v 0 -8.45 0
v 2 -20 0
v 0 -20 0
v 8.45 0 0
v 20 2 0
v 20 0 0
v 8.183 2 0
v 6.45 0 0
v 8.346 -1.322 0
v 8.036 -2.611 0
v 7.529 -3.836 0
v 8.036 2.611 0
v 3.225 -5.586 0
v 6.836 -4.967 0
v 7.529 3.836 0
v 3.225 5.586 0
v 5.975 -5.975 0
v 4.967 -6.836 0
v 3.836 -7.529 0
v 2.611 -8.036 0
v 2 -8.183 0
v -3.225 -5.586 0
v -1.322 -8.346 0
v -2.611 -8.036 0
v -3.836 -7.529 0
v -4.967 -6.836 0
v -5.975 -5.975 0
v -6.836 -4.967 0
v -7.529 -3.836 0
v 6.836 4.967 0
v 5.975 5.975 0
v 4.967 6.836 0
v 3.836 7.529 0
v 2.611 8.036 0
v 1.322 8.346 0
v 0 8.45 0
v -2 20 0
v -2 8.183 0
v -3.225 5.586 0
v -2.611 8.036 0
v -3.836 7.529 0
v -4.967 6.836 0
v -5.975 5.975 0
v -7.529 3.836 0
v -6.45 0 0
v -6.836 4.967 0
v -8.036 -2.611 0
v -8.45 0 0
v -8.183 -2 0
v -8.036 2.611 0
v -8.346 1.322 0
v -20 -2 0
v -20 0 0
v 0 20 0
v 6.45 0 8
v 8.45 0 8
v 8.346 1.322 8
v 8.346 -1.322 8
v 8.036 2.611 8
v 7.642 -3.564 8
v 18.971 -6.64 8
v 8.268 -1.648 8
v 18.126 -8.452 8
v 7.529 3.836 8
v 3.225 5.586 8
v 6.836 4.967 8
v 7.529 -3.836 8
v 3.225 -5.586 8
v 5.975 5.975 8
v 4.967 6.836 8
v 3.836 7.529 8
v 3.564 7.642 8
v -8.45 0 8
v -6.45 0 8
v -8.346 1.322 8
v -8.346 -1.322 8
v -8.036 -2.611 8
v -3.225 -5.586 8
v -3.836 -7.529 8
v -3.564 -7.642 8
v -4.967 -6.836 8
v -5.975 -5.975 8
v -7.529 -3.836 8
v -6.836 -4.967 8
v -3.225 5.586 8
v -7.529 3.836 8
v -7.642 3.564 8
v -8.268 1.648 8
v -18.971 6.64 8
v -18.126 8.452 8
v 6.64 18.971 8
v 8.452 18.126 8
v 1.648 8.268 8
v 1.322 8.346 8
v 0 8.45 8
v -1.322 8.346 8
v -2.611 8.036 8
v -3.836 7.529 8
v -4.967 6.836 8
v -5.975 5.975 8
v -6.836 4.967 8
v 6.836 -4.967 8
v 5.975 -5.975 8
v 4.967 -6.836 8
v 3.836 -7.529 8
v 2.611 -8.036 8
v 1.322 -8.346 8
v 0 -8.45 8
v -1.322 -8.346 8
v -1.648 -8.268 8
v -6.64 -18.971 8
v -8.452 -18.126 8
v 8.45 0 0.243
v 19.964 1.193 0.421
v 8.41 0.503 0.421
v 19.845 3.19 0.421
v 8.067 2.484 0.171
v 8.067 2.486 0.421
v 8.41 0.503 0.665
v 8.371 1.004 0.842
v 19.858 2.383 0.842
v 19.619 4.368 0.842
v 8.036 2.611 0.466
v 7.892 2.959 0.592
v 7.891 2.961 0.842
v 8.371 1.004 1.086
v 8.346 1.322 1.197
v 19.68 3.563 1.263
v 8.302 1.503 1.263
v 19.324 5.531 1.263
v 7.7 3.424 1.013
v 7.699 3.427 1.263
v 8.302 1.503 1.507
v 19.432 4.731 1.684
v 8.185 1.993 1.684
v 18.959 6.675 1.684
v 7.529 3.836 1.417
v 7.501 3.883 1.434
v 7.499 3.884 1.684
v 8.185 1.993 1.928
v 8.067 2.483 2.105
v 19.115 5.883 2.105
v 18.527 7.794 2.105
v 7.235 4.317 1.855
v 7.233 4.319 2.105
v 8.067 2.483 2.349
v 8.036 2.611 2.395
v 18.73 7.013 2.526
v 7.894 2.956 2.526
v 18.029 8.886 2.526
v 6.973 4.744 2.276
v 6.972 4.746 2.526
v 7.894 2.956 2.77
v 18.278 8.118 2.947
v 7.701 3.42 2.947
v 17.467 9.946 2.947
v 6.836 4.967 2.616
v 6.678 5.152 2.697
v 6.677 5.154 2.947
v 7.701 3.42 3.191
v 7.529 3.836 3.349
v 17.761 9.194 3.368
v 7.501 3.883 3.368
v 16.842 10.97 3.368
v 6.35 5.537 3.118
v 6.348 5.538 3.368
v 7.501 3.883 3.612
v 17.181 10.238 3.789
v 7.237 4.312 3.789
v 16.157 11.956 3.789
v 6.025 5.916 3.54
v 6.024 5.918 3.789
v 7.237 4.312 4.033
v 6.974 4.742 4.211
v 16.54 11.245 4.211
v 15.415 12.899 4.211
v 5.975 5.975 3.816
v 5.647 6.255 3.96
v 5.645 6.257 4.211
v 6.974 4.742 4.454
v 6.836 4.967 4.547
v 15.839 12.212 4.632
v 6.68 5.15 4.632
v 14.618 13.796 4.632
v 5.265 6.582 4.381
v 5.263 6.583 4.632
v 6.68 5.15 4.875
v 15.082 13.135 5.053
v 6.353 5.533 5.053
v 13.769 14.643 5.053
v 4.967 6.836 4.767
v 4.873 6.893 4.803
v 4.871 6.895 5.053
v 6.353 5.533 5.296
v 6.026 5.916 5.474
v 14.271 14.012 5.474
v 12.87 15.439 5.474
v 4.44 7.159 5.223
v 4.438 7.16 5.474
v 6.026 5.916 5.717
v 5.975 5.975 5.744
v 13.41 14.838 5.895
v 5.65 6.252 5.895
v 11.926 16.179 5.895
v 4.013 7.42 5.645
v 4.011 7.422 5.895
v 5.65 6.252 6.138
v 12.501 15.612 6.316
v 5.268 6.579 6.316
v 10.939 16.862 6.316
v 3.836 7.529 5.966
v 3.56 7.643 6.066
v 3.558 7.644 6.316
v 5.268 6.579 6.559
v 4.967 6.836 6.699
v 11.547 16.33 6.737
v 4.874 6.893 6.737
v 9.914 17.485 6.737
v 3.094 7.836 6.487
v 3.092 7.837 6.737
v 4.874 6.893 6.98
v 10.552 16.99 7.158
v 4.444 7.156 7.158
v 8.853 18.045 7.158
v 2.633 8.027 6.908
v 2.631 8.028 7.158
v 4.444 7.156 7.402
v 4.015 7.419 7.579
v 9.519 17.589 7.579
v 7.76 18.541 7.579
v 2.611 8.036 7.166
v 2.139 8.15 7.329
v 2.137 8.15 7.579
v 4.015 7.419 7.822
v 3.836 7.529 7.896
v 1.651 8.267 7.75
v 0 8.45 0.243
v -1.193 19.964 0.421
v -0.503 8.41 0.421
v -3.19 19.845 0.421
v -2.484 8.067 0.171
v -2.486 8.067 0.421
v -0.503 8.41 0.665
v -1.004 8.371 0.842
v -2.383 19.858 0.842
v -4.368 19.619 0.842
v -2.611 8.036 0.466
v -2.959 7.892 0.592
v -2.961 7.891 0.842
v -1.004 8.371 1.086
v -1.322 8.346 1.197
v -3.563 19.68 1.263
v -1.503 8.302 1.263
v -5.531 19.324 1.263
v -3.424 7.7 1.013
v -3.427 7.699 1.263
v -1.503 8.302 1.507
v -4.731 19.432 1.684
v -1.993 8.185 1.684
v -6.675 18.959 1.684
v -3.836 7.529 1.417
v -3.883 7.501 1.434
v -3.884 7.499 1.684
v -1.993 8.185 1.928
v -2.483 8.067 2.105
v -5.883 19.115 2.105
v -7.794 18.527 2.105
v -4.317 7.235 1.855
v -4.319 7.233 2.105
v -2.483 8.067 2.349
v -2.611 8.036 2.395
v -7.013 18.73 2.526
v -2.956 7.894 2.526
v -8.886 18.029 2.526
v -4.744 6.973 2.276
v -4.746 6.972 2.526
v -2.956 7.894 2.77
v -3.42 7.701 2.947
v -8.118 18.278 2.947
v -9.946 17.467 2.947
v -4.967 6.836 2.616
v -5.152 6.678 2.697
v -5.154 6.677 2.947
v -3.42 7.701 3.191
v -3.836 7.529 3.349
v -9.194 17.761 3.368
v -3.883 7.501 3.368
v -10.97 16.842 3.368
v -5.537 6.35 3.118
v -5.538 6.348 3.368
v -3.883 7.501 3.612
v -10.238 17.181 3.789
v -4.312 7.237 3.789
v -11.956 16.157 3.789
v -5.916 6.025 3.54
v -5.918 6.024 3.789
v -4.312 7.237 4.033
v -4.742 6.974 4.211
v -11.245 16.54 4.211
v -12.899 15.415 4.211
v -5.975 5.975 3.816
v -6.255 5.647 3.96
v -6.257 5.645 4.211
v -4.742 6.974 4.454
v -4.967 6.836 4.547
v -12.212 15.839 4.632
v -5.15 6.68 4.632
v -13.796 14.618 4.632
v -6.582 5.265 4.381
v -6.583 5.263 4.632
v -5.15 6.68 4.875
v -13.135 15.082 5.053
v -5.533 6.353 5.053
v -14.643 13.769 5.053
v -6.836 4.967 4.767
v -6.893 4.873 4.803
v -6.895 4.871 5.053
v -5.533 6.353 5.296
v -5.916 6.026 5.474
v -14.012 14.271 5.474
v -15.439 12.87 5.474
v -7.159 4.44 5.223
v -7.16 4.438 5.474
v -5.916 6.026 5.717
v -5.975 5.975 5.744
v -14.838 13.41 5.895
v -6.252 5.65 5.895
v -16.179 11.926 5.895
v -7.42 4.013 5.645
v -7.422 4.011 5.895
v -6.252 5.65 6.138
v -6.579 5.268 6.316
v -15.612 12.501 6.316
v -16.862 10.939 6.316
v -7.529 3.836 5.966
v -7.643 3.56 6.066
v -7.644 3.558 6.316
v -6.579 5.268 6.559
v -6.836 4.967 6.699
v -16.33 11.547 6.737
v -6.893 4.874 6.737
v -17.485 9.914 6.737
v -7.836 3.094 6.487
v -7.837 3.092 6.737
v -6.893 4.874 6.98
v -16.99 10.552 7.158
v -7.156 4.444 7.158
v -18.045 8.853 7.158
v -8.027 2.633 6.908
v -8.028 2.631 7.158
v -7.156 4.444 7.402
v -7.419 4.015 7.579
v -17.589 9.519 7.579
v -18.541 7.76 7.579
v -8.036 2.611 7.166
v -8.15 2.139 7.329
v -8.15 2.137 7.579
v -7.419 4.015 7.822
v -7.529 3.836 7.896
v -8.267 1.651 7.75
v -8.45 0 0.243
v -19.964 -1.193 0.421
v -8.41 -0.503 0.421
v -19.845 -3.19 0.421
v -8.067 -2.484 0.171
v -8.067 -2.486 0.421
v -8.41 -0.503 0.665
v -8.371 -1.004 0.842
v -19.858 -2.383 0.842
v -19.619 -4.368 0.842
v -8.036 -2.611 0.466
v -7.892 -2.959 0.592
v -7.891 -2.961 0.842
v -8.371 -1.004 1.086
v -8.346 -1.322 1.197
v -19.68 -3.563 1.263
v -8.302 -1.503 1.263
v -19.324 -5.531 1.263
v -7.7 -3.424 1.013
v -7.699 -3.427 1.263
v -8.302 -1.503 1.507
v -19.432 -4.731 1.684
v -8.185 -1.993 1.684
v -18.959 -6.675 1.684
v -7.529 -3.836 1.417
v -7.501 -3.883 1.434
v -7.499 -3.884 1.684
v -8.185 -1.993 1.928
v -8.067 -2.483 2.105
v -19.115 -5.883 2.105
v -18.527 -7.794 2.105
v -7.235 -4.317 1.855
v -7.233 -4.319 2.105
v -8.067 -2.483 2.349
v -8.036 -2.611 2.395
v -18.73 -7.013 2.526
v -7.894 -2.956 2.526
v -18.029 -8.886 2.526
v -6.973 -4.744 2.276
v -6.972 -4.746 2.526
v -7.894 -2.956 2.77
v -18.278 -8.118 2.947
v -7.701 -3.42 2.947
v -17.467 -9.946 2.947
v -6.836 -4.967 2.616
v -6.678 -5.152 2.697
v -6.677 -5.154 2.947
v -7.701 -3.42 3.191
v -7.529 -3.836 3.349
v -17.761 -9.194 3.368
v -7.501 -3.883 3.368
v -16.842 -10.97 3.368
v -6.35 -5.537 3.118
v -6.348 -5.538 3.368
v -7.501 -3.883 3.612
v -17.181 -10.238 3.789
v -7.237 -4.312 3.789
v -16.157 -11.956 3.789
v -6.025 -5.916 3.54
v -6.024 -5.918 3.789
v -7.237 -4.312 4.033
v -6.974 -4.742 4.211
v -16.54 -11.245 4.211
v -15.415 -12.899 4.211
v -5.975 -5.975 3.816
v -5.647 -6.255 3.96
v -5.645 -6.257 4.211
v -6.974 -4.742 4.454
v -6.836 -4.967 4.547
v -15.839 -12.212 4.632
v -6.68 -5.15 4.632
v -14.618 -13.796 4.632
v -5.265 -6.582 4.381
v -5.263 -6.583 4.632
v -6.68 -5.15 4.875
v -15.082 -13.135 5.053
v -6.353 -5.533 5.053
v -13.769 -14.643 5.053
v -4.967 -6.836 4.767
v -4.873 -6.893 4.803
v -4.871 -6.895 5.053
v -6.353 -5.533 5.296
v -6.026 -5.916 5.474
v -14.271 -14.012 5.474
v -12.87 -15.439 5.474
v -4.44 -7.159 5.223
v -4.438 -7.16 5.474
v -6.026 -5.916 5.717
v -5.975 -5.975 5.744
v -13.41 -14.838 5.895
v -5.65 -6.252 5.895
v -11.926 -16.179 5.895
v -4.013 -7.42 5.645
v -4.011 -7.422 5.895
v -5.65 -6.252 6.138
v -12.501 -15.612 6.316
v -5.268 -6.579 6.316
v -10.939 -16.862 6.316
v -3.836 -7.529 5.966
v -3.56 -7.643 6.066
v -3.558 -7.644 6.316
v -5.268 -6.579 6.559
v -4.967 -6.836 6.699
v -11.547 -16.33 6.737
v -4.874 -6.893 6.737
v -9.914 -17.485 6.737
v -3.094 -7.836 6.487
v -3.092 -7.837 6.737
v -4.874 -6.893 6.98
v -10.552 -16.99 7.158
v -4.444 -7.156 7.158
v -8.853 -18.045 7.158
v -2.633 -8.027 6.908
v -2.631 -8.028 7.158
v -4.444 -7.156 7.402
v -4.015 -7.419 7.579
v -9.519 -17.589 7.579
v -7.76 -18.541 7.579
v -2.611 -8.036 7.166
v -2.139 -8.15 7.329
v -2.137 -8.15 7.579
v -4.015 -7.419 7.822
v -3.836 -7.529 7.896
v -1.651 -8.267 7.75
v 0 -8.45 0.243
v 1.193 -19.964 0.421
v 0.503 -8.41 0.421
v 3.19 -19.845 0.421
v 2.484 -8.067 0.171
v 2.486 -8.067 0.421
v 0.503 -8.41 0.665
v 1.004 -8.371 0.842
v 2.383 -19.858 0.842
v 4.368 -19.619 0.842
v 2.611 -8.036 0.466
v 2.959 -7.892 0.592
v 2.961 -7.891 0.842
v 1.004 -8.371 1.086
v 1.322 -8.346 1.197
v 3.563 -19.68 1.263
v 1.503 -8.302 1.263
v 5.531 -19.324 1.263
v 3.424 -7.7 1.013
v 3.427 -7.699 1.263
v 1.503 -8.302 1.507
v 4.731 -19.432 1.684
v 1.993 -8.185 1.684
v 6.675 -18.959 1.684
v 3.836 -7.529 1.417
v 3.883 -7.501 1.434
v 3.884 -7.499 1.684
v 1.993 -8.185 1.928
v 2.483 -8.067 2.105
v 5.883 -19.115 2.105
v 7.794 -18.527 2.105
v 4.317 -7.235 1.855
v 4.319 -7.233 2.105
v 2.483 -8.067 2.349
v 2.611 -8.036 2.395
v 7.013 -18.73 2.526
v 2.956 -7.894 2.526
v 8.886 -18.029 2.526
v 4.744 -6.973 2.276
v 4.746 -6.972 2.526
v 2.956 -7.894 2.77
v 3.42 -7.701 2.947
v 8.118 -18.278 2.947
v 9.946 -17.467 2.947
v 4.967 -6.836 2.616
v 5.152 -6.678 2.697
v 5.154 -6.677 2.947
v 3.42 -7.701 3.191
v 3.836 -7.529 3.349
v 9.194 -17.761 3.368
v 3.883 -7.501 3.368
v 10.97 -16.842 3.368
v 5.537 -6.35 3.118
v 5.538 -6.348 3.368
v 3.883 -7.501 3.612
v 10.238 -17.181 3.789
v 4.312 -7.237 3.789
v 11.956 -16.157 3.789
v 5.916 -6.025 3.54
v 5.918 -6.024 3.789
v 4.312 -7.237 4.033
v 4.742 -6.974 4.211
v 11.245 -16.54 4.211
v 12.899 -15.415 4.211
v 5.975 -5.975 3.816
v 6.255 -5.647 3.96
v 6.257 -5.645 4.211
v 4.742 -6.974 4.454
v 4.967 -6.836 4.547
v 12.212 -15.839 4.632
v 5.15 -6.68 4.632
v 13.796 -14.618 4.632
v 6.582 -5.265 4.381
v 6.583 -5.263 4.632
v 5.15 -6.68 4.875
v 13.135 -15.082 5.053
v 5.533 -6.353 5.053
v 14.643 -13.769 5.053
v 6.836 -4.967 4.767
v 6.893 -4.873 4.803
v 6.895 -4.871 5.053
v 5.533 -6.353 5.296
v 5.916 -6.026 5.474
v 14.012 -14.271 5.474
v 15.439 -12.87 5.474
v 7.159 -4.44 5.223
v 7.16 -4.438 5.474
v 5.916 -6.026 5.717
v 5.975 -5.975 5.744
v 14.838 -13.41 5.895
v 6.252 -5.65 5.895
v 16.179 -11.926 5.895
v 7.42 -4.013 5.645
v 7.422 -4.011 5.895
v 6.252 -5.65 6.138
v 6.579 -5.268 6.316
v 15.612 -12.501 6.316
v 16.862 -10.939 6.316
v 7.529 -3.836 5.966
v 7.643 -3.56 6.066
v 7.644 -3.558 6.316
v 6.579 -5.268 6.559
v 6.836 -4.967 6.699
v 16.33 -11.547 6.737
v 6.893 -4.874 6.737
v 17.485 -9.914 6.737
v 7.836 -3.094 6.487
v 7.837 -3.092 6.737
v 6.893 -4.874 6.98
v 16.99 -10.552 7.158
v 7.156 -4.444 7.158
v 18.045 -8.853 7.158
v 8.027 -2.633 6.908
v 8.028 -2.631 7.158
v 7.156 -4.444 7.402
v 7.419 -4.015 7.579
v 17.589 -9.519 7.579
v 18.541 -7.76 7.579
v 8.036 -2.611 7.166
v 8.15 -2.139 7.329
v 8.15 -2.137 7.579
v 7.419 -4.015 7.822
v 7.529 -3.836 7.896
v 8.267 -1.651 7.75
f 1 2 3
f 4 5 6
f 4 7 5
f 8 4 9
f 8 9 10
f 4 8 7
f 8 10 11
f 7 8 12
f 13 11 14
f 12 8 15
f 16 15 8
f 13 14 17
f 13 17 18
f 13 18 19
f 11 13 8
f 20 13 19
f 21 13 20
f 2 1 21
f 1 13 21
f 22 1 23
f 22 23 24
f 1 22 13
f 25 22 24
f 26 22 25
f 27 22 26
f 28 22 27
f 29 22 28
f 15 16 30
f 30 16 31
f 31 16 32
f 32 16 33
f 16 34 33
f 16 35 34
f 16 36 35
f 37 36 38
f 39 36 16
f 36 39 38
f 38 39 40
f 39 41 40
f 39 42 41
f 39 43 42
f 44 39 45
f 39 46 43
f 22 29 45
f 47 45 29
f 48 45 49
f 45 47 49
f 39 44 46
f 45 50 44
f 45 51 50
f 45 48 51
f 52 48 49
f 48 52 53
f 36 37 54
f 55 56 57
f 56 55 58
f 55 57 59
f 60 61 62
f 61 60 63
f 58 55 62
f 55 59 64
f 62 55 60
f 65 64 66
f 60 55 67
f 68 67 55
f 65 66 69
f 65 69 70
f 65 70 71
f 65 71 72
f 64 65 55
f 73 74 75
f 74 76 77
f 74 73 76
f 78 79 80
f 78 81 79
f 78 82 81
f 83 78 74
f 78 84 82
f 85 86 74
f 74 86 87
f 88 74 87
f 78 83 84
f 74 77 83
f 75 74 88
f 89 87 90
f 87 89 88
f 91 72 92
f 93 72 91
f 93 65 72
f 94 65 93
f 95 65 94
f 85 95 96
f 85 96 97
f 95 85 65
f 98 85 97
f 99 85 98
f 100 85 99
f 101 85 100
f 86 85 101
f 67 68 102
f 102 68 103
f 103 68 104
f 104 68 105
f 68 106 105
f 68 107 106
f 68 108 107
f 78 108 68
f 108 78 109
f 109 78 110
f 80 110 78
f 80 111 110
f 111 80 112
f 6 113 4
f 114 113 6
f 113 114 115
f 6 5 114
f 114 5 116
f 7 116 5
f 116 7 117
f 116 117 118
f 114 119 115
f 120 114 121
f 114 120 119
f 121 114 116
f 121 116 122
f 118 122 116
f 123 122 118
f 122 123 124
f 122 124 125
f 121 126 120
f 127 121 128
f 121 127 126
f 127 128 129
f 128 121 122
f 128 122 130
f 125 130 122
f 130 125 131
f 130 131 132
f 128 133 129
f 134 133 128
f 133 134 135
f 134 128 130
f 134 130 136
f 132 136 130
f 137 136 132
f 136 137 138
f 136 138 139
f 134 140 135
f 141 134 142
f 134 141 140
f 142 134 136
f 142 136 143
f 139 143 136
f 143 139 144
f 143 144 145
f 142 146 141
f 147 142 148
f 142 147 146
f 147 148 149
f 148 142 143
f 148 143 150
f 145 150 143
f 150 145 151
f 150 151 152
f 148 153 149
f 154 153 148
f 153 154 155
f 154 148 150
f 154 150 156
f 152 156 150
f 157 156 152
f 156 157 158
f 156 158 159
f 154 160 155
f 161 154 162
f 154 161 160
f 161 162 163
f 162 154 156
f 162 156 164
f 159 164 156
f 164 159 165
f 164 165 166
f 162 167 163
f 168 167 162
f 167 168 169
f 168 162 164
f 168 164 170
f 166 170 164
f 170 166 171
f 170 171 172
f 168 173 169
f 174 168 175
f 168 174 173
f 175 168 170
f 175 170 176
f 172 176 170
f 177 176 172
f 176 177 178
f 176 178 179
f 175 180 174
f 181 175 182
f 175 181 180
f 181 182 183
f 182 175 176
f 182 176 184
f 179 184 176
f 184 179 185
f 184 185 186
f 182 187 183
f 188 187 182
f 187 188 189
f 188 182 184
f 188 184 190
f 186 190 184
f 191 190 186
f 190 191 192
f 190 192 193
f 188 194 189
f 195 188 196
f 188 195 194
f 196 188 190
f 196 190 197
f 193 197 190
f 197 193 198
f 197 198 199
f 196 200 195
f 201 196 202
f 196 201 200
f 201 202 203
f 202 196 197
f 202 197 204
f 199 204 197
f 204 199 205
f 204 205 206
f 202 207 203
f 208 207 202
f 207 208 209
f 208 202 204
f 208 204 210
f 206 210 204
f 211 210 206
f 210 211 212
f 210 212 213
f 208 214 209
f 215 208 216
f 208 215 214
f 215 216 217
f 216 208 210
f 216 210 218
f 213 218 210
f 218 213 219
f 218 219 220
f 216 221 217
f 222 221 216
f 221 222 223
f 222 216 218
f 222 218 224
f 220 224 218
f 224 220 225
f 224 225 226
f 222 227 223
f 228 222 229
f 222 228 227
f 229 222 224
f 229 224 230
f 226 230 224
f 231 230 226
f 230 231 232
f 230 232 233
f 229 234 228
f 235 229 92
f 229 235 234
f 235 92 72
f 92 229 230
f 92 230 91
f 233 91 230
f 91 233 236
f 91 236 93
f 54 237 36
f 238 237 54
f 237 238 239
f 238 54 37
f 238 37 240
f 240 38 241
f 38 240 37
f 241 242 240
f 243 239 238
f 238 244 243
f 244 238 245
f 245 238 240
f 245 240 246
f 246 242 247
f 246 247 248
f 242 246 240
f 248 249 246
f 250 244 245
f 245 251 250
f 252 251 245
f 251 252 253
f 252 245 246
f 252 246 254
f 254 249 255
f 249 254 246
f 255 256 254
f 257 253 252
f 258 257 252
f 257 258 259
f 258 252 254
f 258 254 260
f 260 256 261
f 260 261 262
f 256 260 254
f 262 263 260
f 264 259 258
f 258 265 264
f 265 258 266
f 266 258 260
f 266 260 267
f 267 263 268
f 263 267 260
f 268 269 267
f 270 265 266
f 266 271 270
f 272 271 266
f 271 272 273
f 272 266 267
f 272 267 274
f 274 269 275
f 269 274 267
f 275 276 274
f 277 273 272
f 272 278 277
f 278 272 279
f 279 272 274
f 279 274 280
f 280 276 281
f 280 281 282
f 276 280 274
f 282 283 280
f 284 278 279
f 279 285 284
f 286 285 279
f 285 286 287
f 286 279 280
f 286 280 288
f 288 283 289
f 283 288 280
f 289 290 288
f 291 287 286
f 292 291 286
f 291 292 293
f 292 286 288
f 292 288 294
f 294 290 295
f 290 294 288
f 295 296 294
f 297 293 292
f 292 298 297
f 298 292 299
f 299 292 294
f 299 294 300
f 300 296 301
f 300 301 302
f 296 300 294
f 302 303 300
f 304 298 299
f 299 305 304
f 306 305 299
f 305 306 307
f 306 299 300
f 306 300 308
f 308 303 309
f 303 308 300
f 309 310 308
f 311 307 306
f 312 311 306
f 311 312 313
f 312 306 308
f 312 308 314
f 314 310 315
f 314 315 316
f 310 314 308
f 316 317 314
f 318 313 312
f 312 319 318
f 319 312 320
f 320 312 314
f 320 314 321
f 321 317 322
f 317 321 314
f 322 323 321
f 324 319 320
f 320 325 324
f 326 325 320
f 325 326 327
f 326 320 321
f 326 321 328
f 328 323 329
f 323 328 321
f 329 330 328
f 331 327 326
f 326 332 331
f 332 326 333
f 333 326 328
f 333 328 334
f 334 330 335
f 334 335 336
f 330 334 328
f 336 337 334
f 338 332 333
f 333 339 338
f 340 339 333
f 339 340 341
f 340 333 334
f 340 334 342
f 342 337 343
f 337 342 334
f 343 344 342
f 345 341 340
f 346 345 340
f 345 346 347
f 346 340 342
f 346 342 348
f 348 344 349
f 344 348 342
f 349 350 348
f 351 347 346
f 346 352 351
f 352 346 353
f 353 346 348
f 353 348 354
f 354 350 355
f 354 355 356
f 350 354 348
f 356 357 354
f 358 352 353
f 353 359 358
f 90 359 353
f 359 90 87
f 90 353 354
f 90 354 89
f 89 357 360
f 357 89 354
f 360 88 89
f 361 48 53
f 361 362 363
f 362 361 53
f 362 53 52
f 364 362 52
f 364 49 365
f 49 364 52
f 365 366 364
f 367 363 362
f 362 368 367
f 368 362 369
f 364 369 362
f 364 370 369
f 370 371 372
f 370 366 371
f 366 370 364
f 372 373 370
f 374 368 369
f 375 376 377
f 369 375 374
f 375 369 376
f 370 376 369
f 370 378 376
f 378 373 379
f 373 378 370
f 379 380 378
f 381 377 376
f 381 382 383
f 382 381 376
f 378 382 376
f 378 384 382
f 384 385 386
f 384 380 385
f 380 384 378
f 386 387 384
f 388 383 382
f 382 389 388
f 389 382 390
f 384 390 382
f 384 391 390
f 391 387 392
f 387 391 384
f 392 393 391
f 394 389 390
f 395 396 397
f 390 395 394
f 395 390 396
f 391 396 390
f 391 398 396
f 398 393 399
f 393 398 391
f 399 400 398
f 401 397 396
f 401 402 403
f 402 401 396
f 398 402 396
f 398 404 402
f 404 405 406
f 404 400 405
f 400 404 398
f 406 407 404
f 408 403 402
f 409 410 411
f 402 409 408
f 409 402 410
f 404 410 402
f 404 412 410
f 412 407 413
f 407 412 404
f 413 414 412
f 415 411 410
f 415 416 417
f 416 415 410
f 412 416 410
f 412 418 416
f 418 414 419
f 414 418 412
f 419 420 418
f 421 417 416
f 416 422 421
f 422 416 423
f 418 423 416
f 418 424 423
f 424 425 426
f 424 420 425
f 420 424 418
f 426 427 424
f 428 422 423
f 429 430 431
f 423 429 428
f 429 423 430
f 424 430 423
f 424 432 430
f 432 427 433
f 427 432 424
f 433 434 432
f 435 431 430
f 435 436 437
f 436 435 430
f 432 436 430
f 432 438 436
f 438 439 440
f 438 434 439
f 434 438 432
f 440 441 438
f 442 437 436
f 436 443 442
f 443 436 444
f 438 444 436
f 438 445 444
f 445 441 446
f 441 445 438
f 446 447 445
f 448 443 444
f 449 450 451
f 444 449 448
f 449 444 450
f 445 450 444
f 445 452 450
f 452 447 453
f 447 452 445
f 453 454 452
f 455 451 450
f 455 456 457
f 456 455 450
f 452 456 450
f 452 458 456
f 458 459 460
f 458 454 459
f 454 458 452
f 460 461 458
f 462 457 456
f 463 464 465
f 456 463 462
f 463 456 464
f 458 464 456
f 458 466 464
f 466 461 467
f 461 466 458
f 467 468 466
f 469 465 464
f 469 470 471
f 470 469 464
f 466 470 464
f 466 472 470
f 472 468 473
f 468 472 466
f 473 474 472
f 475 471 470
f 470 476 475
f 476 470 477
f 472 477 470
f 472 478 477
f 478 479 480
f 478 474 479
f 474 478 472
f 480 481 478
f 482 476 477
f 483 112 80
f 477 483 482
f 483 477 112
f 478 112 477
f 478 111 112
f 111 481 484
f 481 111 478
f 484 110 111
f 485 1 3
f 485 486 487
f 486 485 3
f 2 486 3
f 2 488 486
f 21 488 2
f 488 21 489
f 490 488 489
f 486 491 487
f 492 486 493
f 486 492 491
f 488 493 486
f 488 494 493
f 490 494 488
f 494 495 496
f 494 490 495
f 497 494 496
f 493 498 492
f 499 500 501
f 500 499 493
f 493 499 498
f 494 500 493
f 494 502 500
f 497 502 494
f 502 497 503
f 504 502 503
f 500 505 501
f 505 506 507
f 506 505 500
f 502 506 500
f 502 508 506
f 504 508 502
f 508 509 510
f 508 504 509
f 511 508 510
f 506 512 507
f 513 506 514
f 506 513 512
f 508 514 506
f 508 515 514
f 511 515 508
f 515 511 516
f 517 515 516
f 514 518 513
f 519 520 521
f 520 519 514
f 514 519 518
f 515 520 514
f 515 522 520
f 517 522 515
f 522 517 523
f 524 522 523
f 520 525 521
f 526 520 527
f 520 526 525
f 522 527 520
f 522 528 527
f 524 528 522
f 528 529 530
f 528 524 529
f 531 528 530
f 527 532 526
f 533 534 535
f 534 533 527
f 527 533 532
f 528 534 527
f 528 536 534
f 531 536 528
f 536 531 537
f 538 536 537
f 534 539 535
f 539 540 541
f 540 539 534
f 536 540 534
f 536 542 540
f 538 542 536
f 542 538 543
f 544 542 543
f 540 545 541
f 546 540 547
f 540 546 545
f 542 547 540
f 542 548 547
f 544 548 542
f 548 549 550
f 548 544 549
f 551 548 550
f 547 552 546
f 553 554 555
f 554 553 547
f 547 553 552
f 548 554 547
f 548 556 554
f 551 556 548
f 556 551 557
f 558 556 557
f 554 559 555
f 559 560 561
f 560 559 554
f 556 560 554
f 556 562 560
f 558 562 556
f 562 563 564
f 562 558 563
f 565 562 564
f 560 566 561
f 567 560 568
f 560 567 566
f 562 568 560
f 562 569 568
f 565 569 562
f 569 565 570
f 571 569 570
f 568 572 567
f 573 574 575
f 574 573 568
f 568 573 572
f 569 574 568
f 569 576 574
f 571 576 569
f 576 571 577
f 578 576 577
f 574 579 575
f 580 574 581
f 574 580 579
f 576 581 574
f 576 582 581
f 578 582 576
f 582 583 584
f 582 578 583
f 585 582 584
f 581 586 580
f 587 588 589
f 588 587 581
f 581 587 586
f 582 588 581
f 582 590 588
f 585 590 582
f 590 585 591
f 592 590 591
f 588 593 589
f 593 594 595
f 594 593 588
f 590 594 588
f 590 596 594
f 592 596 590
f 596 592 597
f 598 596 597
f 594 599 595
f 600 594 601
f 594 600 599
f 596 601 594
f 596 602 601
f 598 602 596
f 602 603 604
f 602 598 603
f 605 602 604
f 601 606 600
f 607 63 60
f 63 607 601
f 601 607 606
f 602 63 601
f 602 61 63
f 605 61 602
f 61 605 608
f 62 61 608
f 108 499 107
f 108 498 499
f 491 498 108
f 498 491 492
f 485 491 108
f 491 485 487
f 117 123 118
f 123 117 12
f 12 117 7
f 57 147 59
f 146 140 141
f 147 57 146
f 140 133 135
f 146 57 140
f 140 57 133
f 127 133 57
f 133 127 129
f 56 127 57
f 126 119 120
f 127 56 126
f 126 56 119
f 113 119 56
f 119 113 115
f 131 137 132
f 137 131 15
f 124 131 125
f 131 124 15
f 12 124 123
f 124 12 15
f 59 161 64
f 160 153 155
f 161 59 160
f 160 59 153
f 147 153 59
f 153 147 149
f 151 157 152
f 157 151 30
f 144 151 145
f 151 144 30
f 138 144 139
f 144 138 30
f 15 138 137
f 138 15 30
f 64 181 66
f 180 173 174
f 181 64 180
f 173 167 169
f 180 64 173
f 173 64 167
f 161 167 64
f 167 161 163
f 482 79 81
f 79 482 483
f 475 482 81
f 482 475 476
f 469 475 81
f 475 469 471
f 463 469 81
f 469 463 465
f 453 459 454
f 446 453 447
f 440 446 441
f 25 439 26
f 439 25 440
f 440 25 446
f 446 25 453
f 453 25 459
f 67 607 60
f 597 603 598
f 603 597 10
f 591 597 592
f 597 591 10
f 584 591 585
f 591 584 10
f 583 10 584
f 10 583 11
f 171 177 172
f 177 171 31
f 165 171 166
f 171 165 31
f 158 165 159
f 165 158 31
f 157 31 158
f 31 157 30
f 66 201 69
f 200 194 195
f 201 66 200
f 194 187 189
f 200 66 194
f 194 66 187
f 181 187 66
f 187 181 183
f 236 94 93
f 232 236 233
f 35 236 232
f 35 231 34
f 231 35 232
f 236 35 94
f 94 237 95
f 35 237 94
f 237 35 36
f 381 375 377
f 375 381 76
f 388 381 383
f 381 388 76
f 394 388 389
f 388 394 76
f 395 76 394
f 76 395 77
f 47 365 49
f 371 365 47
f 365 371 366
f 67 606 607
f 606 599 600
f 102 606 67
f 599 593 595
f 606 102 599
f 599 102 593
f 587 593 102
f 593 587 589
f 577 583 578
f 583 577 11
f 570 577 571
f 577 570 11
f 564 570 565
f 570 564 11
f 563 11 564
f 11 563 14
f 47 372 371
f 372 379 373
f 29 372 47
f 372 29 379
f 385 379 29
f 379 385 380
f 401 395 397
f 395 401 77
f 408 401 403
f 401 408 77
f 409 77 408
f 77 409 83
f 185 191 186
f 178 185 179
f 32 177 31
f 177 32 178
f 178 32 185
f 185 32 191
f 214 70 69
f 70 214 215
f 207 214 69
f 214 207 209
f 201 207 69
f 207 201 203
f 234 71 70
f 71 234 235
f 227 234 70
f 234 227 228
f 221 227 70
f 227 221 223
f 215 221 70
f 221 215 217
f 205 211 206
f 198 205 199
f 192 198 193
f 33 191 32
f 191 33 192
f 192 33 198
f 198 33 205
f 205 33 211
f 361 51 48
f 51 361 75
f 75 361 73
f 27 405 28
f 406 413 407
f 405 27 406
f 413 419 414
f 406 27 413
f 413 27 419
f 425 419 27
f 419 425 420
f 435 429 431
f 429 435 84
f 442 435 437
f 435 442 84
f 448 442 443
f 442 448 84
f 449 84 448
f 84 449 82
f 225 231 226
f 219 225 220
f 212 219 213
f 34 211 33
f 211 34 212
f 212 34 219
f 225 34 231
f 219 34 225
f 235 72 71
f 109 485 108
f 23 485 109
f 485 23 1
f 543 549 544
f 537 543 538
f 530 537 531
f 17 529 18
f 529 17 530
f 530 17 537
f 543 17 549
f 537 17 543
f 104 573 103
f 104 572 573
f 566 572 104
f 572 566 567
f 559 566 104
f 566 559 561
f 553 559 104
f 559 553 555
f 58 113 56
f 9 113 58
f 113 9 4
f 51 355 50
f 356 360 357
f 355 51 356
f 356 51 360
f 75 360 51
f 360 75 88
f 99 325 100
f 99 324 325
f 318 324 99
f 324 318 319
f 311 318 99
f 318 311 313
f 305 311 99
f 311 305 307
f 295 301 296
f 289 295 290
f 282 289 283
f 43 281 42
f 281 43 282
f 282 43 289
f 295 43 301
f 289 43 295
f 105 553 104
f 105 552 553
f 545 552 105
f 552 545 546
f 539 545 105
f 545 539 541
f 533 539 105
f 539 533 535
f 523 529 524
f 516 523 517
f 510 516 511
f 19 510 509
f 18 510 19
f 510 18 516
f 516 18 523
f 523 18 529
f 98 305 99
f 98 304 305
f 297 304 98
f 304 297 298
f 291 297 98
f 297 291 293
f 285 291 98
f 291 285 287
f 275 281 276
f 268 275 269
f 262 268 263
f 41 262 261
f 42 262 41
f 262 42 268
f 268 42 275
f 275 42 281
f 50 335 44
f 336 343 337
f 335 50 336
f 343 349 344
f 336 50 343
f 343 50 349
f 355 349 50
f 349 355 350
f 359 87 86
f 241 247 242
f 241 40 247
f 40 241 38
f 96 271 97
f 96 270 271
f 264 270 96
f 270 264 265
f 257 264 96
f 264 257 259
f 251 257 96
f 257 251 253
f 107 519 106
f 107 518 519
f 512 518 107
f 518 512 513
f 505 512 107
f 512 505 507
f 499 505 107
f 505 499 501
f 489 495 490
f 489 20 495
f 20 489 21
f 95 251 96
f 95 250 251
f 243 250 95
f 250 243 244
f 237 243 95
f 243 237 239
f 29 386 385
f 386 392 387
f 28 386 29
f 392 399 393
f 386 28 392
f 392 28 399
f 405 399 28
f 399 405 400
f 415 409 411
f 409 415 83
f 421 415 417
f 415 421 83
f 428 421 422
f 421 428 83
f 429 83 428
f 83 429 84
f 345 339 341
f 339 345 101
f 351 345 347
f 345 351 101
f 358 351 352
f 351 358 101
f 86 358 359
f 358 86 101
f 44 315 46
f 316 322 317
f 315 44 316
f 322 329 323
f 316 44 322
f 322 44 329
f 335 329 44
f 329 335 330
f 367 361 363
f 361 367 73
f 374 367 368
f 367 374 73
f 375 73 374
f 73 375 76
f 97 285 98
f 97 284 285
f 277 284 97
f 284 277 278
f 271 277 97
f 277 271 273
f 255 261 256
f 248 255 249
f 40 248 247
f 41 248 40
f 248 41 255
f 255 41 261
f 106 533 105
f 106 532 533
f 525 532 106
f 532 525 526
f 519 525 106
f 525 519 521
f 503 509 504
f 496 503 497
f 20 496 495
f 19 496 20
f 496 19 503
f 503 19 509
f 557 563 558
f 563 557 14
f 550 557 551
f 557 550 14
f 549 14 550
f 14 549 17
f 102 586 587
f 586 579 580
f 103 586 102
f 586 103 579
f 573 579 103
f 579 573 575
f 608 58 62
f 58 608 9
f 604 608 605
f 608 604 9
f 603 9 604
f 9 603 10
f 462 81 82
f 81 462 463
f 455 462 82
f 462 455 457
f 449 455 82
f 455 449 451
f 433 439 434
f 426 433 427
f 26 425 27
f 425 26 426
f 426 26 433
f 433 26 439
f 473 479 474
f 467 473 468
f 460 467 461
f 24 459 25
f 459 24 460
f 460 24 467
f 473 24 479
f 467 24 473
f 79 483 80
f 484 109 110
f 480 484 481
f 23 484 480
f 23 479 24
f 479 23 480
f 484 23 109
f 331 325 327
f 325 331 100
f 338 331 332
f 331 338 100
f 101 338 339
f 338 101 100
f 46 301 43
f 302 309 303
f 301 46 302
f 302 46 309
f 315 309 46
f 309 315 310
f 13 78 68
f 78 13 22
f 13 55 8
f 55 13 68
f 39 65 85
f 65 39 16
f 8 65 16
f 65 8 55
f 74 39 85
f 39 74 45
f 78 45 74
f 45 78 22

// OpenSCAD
// file: inc/constants.scad
pi=3.1415;
$fn=80;
//hole radius
hr = 6;

//distance between holes
dh = 12;

//x distance between holes
dhx = 12;

//y distance between holes
dhy = 14.4;
//dhy=20;

//give between two gears
giveg = .5;

//shaft give
sgive = .6;

//plug give
//pgive = .15;

pgive = .12;


//fastener give (holes)
fgive = .13;

pitch=.25;

//gear give (hole)
ggive = .45;

//spacer give
spgive = .3;


////fastener sizes
//notch width
notchw = 0;

//notch height
notchh = 0;

//fastener height
fh = 4;

//fastener width (sans notch)
fw = hr;


//gear hole radius
ghr = 1.4;

//arrow length
al = 8;


//give for the nut
nut_give = .8;
// main file
include <inc/constants.scad>
$fn=40;
//hole radius
//height
h=8;

//hole wall thickness
hwth = 2;

module blade(th=2, length=20)
{
linear_extrude(height=h, twist=-65, convexity=200, $fn=100)
square([length,th]);

}


module prop(blades=4)
{
  difference()
  {
    union()
    {
      for(i=[0:blades])
        rotate([0,0,360*i/blades])
        blade();
      cylinder(r=hr+hwth+ggive, h=h);
    }

    translate([0,0,-.1])
    cylinder(r=hr+ggive, h=h+.2, $fn=6);
  }
}

prop(4);
